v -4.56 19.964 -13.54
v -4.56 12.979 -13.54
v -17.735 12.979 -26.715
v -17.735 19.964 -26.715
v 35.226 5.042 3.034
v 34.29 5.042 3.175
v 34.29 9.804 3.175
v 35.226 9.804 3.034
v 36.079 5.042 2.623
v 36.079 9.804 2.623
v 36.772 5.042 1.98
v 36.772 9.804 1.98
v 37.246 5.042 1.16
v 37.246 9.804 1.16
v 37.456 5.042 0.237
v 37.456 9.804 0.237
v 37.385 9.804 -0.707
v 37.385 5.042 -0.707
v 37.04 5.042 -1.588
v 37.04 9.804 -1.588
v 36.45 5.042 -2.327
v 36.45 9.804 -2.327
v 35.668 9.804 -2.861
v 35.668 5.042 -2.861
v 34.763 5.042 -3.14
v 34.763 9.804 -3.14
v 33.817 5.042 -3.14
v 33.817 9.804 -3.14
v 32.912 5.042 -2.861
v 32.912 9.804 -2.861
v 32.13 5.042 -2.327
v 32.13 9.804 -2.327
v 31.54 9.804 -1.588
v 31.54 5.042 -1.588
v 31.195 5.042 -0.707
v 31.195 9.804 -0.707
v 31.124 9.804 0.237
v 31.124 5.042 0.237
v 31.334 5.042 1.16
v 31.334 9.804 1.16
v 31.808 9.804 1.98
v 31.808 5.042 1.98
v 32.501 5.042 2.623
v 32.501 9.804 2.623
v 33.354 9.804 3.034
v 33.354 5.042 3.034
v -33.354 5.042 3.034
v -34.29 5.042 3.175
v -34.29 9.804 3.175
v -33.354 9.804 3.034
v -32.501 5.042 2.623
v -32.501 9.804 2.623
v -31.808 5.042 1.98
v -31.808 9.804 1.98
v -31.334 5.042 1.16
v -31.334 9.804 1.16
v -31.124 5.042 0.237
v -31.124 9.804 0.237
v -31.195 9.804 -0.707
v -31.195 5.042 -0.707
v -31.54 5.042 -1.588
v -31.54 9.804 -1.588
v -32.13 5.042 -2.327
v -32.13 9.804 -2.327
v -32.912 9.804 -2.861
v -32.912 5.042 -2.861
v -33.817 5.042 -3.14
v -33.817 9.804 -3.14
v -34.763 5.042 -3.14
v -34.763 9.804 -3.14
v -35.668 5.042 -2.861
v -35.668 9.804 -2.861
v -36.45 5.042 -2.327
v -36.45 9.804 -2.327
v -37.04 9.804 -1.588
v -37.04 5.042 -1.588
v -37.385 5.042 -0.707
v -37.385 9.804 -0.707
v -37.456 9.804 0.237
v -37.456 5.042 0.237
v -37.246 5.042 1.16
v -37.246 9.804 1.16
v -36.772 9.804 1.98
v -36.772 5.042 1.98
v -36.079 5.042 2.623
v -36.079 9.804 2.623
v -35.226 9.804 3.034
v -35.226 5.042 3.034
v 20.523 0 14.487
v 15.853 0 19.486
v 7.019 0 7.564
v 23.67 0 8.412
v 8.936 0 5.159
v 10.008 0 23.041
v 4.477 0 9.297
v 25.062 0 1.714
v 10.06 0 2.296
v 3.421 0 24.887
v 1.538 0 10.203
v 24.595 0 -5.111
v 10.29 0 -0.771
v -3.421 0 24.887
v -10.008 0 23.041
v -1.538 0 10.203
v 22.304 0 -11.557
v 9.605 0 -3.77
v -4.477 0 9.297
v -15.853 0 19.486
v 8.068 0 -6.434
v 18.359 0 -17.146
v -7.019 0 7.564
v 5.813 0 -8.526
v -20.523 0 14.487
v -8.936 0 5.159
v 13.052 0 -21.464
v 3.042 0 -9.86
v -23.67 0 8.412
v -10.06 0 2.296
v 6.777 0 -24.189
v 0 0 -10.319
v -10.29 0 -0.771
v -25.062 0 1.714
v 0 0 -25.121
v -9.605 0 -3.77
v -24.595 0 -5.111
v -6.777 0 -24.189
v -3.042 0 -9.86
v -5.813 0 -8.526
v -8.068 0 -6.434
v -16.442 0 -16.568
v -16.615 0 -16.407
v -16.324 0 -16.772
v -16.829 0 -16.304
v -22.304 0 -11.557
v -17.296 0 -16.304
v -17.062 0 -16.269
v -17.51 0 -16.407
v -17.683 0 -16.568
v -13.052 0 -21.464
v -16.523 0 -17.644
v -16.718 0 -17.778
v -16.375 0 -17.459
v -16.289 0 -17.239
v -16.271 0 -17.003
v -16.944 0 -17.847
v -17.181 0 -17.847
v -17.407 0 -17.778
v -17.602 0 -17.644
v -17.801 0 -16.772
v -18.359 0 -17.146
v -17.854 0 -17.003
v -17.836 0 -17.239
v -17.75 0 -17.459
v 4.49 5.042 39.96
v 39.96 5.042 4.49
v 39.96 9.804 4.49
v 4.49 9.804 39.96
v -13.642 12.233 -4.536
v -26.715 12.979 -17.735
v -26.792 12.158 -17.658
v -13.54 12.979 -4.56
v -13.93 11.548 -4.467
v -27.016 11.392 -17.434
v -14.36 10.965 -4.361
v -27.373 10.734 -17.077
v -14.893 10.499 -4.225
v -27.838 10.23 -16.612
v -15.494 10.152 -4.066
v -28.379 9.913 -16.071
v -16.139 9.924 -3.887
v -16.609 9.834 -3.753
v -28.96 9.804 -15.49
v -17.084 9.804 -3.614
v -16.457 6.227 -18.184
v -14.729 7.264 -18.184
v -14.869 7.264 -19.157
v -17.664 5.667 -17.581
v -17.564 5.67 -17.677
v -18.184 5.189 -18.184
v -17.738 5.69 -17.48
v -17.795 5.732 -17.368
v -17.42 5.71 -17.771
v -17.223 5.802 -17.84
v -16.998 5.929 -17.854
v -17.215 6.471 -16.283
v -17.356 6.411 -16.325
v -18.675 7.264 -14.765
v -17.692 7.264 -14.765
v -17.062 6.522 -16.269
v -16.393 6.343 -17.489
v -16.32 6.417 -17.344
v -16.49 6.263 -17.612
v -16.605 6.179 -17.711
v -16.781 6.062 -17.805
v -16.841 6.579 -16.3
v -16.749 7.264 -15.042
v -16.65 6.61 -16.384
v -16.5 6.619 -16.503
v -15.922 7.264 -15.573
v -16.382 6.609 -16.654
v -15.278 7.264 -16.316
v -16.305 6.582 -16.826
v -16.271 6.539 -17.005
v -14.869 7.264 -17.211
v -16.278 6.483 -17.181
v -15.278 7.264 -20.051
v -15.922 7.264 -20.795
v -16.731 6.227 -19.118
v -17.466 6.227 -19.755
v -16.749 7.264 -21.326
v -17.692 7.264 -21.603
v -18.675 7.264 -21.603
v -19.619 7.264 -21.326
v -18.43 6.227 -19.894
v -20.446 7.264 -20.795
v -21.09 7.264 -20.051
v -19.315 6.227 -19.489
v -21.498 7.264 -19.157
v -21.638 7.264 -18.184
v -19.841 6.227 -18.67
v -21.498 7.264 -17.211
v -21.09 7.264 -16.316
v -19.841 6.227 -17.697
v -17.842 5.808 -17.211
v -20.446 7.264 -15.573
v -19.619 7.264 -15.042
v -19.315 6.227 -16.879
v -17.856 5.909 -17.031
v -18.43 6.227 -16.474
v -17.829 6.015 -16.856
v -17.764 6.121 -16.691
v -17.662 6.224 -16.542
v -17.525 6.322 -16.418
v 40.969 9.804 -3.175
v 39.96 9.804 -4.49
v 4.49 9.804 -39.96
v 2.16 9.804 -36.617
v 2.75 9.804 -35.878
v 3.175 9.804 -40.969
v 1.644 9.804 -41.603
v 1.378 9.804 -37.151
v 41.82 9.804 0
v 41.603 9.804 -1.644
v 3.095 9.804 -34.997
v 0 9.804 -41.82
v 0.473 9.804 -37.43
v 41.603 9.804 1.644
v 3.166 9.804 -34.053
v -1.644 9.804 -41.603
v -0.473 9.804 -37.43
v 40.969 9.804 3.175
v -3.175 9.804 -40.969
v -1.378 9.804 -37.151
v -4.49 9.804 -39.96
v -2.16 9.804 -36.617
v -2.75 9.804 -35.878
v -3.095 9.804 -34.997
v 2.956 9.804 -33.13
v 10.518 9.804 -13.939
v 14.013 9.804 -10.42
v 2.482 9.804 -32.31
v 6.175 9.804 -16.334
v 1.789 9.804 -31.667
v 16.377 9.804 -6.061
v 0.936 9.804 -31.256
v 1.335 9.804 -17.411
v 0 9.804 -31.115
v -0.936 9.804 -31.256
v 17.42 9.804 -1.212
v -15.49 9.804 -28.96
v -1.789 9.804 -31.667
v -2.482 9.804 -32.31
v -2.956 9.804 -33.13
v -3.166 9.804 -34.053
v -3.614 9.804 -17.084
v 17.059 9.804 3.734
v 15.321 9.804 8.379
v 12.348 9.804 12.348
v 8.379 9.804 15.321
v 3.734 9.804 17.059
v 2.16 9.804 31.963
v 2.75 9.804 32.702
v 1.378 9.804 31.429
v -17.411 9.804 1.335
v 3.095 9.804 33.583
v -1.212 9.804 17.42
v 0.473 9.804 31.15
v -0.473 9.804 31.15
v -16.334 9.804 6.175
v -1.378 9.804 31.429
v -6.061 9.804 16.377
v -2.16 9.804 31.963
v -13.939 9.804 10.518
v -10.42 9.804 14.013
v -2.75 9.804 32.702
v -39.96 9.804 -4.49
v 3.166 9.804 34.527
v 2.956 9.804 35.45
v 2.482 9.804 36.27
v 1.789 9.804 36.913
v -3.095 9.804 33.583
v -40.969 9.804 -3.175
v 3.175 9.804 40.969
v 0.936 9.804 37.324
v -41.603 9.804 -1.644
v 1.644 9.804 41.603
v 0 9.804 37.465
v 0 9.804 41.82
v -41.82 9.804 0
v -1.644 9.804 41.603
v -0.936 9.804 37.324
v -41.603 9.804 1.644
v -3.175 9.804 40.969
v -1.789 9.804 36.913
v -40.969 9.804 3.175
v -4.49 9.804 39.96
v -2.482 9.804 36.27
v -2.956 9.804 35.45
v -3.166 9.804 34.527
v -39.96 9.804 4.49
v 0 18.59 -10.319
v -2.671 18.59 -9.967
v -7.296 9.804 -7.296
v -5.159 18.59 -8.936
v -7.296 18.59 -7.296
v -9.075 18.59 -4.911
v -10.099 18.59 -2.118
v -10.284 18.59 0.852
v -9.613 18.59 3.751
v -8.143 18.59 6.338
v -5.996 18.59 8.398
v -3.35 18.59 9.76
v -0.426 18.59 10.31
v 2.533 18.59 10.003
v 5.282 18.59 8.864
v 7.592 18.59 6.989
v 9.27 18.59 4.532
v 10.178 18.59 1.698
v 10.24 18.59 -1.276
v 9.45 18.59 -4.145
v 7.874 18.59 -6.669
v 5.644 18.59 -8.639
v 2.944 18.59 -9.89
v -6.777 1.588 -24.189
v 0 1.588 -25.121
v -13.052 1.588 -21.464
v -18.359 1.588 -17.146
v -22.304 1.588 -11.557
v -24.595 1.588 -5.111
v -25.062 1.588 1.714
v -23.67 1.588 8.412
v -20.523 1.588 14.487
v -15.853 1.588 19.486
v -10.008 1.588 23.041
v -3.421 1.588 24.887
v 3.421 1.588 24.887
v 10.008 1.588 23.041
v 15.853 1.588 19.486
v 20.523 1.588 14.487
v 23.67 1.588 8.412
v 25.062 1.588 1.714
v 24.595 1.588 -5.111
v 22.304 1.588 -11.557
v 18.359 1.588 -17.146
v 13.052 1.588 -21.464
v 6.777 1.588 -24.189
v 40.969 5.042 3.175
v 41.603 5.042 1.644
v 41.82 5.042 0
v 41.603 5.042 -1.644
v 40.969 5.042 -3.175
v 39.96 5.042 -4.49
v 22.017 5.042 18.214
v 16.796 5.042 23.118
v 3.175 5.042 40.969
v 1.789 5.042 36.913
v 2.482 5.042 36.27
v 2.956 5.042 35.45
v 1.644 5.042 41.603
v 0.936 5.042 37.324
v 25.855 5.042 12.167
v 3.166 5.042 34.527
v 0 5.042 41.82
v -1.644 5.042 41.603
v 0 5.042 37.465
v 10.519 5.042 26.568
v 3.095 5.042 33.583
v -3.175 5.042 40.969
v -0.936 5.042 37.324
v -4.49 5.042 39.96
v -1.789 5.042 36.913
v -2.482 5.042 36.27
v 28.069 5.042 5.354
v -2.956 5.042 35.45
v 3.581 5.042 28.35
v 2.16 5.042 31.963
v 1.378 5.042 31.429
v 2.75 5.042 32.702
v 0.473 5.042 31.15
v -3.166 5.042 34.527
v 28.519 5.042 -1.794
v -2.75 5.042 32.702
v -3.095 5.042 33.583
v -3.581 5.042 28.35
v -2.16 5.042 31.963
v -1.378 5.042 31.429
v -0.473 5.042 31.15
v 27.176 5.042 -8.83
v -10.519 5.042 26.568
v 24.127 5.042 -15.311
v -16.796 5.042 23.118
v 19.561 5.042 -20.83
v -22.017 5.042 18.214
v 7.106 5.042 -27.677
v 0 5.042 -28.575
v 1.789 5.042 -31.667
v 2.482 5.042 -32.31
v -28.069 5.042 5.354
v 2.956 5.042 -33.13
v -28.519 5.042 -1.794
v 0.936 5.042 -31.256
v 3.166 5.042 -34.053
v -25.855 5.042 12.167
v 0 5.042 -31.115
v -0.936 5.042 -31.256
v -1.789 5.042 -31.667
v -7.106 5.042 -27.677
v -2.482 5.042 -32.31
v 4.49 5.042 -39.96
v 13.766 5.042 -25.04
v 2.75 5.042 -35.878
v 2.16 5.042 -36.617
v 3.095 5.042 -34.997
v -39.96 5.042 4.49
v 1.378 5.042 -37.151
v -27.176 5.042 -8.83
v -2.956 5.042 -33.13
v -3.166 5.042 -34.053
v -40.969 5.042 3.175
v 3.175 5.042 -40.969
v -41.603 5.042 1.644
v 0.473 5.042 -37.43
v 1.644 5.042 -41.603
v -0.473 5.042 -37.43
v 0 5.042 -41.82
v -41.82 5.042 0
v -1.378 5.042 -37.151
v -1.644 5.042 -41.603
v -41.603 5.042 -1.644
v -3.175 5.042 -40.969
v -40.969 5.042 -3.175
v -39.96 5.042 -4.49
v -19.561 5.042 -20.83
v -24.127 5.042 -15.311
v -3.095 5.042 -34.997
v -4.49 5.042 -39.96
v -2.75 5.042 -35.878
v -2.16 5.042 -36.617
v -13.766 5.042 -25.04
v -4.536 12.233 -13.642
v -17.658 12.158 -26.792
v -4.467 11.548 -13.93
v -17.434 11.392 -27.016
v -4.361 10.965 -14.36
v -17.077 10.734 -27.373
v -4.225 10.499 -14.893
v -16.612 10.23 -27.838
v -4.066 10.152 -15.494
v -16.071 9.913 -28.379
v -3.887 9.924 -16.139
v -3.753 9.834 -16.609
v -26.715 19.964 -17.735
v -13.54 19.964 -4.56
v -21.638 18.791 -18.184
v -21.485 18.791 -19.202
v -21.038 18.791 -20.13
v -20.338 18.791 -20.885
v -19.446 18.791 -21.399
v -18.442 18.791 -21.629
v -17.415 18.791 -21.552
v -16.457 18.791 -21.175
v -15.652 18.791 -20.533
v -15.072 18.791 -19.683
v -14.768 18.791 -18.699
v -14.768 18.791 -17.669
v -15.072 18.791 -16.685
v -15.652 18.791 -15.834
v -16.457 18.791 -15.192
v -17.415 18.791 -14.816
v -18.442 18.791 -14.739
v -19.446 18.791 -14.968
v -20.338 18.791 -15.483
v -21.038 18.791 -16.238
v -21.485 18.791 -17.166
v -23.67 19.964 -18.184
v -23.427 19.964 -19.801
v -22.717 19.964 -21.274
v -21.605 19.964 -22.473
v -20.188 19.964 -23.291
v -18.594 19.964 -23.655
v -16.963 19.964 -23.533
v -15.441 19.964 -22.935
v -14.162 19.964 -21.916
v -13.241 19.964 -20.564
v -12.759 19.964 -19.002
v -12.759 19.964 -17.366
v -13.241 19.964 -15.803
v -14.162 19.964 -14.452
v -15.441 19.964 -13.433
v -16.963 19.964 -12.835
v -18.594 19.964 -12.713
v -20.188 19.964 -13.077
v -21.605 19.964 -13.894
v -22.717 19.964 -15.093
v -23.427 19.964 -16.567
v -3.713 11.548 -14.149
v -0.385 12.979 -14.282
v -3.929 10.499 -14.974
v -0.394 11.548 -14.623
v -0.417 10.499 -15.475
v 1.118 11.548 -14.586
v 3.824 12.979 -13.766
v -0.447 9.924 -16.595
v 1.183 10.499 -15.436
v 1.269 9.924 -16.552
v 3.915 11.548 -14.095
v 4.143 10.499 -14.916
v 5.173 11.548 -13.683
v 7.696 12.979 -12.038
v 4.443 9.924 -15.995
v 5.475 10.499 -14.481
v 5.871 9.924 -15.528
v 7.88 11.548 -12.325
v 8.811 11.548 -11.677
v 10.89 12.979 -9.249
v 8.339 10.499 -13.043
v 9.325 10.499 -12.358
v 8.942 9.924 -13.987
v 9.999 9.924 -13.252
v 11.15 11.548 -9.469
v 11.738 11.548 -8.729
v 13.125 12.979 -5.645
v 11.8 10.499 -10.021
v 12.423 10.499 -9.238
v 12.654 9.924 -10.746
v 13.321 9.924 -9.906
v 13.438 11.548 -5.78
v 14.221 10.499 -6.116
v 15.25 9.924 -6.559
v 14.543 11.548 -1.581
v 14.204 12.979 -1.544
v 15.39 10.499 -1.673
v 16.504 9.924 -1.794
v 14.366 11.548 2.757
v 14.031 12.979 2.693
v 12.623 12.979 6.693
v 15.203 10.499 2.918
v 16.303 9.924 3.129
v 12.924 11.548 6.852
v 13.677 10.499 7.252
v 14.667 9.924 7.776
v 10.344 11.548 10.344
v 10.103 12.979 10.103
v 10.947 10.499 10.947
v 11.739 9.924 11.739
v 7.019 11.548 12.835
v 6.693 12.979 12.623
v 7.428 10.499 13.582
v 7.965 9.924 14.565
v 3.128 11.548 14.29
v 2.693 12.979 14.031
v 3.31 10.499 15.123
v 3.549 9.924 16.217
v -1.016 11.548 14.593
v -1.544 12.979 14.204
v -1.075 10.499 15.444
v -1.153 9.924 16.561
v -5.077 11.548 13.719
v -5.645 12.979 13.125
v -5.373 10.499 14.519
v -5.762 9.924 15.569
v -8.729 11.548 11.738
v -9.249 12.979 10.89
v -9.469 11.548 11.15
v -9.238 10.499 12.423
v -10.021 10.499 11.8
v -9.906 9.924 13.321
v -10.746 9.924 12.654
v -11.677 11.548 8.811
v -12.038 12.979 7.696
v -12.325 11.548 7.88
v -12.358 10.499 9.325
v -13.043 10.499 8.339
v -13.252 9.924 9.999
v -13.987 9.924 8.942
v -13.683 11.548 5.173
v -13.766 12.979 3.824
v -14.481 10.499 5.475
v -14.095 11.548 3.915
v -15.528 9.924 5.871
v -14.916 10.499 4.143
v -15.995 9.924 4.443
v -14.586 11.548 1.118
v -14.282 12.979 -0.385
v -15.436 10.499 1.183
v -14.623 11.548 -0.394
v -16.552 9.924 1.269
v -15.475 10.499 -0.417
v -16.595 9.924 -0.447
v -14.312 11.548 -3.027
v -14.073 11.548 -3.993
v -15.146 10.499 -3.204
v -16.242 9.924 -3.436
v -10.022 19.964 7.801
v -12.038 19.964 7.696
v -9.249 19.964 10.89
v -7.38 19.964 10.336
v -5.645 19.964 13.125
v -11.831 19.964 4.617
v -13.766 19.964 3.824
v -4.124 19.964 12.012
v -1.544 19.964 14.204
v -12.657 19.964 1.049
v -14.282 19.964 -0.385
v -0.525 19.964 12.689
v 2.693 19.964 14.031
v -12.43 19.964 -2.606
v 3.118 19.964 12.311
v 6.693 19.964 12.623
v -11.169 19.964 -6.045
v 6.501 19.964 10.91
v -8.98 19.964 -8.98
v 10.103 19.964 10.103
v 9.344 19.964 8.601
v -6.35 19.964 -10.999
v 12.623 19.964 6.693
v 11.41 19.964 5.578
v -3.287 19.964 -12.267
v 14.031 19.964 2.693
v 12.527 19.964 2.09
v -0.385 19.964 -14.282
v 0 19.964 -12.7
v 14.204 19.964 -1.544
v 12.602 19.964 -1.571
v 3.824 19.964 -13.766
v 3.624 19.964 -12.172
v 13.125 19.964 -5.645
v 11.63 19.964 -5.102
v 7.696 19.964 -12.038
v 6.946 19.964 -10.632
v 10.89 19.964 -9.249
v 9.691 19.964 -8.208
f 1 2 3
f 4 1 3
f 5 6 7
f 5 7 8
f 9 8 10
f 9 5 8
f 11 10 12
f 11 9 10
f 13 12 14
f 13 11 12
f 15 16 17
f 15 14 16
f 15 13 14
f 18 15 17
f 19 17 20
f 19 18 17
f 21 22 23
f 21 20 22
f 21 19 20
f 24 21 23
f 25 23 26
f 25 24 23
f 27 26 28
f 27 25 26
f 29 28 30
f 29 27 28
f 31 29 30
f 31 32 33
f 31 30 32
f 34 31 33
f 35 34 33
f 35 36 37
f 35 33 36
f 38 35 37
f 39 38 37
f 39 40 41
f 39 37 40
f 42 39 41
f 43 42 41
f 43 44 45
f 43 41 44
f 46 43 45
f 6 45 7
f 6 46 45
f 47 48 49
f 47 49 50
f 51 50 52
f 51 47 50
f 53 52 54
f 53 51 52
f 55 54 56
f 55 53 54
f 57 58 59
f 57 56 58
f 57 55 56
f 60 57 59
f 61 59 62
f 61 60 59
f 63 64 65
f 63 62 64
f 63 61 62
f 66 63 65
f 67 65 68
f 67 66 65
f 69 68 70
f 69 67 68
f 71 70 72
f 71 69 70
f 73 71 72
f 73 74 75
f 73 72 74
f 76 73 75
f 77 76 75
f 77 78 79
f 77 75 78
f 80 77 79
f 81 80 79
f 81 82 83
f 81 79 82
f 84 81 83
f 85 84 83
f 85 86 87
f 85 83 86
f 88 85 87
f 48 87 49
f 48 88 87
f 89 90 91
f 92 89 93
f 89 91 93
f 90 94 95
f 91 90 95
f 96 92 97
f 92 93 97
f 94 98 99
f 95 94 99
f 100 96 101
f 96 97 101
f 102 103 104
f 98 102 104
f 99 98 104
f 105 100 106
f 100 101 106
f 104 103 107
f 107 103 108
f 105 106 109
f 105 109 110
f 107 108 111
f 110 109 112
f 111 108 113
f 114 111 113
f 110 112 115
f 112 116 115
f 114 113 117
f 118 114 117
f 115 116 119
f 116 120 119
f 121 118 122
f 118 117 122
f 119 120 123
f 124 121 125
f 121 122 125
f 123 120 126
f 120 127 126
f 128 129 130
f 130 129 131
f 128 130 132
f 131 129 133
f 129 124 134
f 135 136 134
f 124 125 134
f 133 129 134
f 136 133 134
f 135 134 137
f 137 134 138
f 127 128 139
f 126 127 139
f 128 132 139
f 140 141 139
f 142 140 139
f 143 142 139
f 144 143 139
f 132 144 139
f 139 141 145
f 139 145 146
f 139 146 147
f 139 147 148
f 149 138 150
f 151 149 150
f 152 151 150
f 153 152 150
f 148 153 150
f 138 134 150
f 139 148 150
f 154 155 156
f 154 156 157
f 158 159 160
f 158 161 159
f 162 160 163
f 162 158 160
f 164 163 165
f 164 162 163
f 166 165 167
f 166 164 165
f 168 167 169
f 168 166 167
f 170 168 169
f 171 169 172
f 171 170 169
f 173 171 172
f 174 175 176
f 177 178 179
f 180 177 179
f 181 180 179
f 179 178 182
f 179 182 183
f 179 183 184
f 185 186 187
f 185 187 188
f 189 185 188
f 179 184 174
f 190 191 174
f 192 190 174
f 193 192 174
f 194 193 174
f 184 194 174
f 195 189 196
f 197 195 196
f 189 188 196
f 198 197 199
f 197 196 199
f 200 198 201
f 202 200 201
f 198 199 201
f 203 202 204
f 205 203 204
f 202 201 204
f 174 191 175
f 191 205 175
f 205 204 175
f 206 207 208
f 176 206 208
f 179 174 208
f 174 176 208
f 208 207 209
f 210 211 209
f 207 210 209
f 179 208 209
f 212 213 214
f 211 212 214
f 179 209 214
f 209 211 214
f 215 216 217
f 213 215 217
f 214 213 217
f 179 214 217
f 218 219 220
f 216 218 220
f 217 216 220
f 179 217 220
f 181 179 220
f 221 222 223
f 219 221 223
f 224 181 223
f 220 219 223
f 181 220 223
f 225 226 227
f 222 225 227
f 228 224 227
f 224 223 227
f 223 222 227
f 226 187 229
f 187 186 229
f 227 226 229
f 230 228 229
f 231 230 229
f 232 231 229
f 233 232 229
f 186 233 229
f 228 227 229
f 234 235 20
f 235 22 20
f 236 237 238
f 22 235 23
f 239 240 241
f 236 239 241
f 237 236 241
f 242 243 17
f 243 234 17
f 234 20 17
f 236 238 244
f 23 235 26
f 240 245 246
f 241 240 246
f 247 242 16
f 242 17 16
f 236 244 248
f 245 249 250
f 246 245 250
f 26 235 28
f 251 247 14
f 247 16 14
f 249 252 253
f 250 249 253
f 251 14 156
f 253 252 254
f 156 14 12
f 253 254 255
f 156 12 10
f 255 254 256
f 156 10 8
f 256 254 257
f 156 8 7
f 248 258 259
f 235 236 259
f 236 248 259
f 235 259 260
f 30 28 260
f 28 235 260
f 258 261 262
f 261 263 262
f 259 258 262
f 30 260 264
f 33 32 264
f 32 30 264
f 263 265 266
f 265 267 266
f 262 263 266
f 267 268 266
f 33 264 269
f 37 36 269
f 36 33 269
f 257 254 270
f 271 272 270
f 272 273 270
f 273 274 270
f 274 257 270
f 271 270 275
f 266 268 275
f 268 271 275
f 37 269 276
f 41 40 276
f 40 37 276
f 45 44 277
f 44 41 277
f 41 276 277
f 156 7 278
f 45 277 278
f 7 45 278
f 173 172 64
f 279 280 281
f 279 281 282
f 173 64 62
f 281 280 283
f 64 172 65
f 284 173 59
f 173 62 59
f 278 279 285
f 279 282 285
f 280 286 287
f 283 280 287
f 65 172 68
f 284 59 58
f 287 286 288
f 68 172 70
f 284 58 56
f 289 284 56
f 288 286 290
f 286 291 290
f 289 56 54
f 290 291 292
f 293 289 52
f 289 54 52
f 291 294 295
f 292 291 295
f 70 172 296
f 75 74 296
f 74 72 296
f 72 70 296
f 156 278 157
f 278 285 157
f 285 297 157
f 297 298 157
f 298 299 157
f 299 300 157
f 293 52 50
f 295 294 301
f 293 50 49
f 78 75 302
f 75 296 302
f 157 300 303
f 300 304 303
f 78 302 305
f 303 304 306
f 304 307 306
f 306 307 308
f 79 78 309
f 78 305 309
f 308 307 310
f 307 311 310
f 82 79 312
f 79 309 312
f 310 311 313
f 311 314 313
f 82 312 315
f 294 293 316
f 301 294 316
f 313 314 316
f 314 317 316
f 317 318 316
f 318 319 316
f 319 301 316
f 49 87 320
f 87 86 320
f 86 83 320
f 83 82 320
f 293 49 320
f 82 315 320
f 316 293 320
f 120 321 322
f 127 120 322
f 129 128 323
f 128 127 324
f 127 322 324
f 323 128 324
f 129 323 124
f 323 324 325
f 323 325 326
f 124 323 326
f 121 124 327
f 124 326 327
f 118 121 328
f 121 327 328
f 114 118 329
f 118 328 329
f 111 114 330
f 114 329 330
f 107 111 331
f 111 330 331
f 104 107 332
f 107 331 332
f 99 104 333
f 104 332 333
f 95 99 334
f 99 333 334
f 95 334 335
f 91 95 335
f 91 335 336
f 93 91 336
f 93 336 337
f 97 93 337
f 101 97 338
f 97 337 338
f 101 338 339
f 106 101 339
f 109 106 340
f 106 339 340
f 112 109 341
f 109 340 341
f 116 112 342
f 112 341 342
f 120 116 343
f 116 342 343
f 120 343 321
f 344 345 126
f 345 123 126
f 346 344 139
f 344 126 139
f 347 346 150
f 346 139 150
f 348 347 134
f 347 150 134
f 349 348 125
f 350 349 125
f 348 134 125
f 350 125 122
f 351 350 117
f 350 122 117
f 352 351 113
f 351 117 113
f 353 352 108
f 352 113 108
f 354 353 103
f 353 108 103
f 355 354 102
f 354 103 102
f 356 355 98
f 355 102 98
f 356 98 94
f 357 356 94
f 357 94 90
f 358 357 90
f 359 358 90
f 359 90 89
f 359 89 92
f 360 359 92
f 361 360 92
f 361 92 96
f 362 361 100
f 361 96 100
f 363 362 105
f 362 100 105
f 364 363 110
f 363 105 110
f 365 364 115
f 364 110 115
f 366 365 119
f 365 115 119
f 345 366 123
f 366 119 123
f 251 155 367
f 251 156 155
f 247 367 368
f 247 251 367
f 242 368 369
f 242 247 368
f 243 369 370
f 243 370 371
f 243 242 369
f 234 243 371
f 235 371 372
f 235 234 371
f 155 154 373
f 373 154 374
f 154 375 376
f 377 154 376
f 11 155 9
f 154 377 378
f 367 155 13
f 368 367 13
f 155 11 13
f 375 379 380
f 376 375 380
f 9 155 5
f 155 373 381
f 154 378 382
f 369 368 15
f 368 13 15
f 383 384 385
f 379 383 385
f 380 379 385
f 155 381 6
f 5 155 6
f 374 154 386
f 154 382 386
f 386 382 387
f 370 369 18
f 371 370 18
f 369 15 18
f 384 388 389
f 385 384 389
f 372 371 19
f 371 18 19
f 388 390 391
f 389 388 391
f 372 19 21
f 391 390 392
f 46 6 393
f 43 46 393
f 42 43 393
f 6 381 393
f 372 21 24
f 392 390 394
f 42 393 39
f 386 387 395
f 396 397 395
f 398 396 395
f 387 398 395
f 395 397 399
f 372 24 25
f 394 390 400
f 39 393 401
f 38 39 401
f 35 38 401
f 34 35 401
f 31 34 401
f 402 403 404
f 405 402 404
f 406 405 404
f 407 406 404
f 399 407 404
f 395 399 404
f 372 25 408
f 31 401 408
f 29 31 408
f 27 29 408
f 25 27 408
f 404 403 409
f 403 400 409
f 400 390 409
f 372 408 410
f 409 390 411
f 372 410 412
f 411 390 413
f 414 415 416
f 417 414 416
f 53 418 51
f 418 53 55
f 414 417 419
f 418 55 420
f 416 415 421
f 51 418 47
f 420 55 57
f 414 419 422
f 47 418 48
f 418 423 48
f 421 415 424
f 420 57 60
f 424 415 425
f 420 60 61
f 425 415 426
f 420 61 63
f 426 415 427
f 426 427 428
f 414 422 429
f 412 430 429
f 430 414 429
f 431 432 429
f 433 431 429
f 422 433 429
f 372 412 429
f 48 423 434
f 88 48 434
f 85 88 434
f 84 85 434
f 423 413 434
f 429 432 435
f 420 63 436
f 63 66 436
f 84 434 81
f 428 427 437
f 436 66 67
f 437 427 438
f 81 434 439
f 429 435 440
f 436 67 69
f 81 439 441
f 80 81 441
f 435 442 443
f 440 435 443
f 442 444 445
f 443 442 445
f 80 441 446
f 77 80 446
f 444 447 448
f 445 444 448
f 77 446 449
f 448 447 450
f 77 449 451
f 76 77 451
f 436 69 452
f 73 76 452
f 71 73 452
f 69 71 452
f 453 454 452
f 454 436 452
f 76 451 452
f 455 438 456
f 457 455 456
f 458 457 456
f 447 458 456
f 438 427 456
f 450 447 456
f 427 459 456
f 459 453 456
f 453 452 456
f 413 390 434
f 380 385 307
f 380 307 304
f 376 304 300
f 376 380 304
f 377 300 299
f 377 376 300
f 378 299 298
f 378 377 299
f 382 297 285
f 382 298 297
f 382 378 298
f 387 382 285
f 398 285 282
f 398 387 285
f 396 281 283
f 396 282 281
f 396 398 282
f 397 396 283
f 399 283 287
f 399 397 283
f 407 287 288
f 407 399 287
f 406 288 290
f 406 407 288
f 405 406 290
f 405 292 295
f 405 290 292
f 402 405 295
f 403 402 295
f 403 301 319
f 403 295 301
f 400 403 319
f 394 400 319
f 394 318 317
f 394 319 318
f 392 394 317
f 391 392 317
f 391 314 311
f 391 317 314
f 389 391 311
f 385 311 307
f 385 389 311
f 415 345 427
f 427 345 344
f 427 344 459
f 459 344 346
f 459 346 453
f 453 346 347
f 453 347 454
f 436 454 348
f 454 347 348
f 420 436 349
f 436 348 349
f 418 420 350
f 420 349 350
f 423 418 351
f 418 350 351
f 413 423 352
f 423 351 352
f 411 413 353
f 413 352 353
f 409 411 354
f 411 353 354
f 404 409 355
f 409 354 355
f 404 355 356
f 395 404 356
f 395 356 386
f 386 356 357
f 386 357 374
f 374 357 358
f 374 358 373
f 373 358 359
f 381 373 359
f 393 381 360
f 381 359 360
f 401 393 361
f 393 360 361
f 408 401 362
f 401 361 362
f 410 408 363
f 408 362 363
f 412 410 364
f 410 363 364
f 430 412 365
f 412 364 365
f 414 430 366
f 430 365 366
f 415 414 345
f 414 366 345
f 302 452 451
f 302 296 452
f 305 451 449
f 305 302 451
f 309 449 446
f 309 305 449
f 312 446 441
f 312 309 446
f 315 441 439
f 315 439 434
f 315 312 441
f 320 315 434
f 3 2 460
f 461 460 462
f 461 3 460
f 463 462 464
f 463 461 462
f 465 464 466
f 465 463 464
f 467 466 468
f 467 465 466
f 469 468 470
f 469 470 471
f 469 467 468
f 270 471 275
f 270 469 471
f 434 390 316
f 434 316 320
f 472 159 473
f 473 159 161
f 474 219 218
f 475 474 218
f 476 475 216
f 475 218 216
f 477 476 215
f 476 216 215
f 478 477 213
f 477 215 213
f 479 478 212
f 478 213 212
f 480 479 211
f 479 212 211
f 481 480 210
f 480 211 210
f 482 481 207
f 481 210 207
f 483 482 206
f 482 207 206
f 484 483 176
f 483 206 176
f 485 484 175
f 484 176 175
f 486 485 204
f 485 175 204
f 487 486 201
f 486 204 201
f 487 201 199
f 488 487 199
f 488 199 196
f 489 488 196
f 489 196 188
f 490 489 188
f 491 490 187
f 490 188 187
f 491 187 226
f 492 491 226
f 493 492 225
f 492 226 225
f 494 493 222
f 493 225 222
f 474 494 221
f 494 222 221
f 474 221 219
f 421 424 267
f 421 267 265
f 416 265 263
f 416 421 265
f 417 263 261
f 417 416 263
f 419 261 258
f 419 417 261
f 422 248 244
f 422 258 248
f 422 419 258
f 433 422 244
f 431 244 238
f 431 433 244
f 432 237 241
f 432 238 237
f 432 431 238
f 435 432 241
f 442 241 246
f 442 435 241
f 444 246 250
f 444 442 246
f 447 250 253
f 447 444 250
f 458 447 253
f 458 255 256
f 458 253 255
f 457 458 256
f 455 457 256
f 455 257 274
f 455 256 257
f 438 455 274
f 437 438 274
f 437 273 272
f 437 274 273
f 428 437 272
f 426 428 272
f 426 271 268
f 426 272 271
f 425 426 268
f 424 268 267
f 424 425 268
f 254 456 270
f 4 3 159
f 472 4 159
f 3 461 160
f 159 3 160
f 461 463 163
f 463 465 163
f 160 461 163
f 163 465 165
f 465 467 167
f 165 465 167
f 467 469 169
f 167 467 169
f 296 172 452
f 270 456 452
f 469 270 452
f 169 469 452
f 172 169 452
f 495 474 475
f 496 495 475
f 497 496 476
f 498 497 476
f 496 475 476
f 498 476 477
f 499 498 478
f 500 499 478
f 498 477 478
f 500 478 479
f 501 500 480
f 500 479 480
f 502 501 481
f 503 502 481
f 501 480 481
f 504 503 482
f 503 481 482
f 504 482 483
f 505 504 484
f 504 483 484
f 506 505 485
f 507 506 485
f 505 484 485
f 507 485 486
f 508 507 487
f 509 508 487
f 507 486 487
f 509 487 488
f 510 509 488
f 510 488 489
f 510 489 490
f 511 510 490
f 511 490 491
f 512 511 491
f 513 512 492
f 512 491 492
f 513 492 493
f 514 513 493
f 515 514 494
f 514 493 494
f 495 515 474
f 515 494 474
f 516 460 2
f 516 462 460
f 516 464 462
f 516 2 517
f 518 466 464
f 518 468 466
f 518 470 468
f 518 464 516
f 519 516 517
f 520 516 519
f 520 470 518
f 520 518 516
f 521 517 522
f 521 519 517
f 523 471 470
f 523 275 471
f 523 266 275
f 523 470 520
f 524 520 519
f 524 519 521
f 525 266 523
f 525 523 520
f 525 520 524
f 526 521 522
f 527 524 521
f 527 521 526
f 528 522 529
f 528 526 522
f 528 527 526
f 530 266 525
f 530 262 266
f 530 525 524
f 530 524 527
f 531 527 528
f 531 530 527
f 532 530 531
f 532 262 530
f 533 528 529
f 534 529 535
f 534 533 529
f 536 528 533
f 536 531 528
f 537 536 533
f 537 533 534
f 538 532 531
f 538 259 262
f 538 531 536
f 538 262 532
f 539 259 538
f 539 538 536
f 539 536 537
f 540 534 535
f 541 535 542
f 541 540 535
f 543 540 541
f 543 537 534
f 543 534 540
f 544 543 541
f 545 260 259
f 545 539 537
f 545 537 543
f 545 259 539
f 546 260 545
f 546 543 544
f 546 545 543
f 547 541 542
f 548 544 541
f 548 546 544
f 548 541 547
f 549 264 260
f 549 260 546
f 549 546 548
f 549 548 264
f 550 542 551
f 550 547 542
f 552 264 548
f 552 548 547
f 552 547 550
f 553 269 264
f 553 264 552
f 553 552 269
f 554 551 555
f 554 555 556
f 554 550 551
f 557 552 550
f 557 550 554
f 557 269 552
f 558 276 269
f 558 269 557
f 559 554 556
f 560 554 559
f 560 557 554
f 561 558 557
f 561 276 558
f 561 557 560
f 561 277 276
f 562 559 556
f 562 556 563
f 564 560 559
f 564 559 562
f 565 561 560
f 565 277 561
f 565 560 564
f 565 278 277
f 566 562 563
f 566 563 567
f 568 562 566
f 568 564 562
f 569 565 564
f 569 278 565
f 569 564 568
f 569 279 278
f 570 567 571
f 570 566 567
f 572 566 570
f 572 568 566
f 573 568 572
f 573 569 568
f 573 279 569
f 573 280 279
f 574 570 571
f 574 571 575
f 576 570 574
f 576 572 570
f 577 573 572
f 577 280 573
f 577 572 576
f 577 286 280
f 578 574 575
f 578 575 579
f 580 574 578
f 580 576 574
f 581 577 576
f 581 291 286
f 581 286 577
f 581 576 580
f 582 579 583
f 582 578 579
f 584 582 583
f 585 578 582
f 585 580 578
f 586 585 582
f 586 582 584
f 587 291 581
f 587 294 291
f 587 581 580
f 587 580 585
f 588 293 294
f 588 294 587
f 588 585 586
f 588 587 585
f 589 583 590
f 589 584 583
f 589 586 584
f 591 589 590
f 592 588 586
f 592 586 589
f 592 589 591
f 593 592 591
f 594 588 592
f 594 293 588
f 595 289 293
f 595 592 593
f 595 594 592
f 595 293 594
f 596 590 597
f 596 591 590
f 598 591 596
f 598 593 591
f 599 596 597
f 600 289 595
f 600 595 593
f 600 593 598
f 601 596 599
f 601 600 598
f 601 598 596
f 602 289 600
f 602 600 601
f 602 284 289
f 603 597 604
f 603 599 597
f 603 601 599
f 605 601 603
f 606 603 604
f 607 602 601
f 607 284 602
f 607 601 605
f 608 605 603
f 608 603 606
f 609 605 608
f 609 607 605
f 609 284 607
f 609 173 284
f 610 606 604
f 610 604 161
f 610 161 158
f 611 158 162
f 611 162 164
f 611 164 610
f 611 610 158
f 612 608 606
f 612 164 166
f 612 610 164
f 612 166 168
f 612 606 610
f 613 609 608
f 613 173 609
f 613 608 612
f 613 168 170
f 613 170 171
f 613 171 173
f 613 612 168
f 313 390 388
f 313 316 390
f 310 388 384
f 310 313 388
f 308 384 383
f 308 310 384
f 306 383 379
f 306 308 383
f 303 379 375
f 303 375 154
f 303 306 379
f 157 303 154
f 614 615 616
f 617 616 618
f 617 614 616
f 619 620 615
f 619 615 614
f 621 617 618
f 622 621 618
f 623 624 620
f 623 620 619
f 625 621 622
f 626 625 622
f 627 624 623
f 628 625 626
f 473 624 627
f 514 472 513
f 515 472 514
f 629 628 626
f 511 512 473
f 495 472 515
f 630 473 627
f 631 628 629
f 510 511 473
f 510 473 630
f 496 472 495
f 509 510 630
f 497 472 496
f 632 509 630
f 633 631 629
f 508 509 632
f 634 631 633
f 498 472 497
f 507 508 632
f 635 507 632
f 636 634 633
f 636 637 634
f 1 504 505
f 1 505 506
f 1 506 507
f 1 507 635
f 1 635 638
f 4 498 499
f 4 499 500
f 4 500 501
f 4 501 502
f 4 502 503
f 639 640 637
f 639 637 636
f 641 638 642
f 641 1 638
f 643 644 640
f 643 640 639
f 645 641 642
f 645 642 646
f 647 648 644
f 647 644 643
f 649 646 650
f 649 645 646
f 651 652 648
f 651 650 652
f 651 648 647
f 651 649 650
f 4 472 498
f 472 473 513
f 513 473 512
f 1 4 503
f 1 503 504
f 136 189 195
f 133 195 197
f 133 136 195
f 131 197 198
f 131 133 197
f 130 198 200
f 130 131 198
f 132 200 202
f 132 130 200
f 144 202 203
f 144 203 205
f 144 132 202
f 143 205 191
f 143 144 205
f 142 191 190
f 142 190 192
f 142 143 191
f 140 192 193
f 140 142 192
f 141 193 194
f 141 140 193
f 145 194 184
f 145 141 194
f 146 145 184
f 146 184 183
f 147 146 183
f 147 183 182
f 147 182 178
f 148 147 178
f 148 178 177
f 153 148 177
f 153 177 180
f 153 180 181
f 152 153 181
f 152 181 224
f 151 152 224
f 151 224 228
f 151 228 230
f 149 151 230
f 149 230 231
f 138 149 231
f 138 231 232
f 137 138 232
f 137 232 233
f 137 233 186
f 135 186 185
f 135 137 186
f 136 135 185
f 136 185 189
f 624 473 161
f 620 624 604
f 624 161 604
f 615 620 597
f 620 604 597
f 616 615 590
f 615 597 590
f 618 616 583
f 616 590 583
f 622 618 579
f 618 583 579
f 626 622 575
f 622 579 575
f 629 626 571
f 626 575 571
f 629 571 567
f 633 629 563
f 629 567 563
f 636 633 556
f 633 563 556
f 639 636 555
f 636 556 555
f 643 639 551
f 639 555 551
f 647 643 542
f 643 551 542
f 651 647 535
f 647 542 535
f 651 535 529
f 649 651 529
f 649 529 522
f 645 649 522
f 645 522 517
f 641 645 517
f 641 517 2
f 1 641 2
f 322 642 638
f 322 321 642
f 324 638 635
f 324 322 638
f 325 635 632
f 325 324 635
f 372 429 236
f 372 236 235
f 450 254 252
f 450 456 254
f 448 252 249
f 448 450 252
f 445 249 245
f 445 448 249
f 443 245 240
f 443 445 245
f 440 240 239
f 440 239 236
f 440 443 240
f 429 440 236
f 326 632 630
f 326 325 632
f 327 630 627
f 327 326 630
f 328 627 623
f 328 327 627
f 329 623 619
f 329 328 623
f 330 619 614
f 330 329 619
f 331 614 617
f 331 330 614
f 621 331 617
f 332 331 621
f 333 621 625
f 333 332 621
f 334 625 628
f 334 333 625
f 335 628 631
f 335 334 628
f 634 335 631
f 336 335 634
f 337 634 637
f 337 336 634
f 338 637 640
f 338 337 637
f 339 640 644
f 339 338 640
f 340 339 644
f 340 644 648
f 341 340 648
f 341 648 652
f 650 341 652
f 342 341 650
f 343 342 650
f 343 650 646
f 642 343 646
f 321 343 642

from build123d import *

# Parameters (mm, degrees)
CUT_EXTRUDE4_DEPTH           = 66.955911542
CUT_EXTRUDE4_DEPTH_BACK      = 66.955911542
SKETCH3_R                    = 3.175
FILLET3_R                    = 6.35
BOSS_EXTRUDE1_START          = 9.8044
BOSS_EXTRUDE1_DEPTH          = 10.16
FILLET2_R                    = 3.175
CHAMFER2_SIZE                = 2.38125
CHAMFER2_SIZE_2              = 1.374815329
CUT_EXTRUDE3_DEPTH           = 63.420823637
CUT_EXTRUDE3_DEPTH_BACK      = 63.420823637
SKETCH8_R                    = 0.79375
F_5_16_24_TAPPED_HOLE1_D     = 6.9088
F_5_16_24_TAPPED_HOLE1_DEPTH = 12.7
F_5_16_24_TAPPED_HOLE1_TIP   = 2.075612922
CHAMFER3_SIZE                = 2.032
CHAMFER3_SIZE2               = 1.173175747


with BuildPart() as part:
    # Sketch1 → Revolve1 (revolve)
    with BuildSketch(Plane.XY, mode=Mode.PRIVATE) as revolve1_sk:
        Polygon((10.31875, 19.9644), (14.2875, 19.9644), (14.2875, 9.8044), (44.45, 9.8044), (44.45, 5.0419), (28.575, 5.0419), (25.1206, 1.5875), (25.1206, 0), (10.31875, 0), align=None)
    revolve(revolve1_sk.sketch.rotate(Axis((0, 0, 0), (0, 1, 0)), 90), axis=Axis((0, 0, 0), (0, 1, 0)))

    # Sketch3 → Cut-Extrude4 (cut, two sides: drawn at the far end of the back side and taken through both)
    with BuildSketch(Plane(origin=(0, 0, 0), x_dir=(1, 0, 0), z_dir=(0, 1, 0)).offset(-CUT_EXTRUDE4_DEPTH_BACK)):
        with BuildLine():
            Line((0, -44.45), (-44.45, 0))
            ThreePointArc((-44.45, 0), (-31.430896424, -31.430896424), (0, -44.45))
        make_face()
        with BuildLine():
            Line((44.45, 0), (0, -44.45))
            ThreePointArc((0, -44.45), (31.430896424, -31.430896424), (44.45, 0))
        make_face()
        with BuildLine():
            ThreePointArc((44.45, 0), (31.430896424, 31.430896424), (0, 44.45))
            Line((0, 44.45), (44.45, 0))
        make_face()
        with BuildLine():
            ThreePointArc((0, 44.45), (-31.430896424, 31.430896424), (-44.45, 0))
            Line((-44.45, 0), (0, 44.45))
        make_face()
        with Locations(Location((-34.29, 0, 0), (0, 0, 270))):
            Circle(SKETCH3_R)
        with Locations(Location((0, 34.29, 0), (0, 0, 270))):
            Circle(SKETCH3_R)
        with Locations(Location((34.29, 0, 0), (0, 0, 270))):
            Circle(SKETCH3_R)
        with Locations(Location((0, -34.29, 0), (0, 0, 270))):
            Circle(SKETCH3_R)
    extrude(amount=CUT_EXTRUDE4_DEPTH + CUT_EXTRUDE4_DEPTH_BACK, mode=Mode.SUBTRACT)

    # Fillet3
    fillet3_edges = [part.edges().sort_by_distance(p)[0] for p in [
        (0, 7.42315, -44.45),
        (44.45, 7.42315, 0),
        (0, 7.42315, 44.45),
        (-44.45, 7.42315, 0),
    ]]
    fillet(fillet3_edges, radius=FILLET3_R)

    # Sketch4 → Boss-Extrude1 (add)
    with BuildSketch(Plane(origin=(0, 0, 0), x_dir=(1, 0, 0), z_dir=(0, 1, 0)).offset(BOSS_EXTRUDE1_START)):
        Polygon((-22.225, 22.225), (-26.715128061, 17.734871939), (-11.786586159, 2.806330038), (-2.806330038, 11.786586159), (-17.734871939, 26.715128061), align=None)
    extrude(amount=BOSS_EXTRUDE1_DEPTH)

    # Fillet2
    fillet2_edges = [part.edges().sort_by_distance(p)[0] for p in [
        (10.102788136, 9.8044, 10.102788136),
        (-11.147443158, 9.8044, -20.127699279),
        (-20.127699279, 9.8044, -11.147443158),
    ]]
    fillet(fillet2_edges, radius=FILLET2_R)

    # Chamfer2
    # the kernel refuses this chamfer: 2.38125, 1.374815329 mm, written as the material it takes off along each edge
    with BuildSketch(Plane(origin=(0, 19.9644, 0), x_dir=(0, 0, -1), z_dir=(1, 0, 0))) as chamfer2_piece_1:
        Polygon((10.31875 + CHAMFER2_SIZE, 0), (10.31875, -CHAMFER2_SIZE_2), (10.31875, 0), align=None)
    revolve(axis=Axis((0, 19.9644, 0), (0, 1, 0)), revolution_arc=45.000000179, mode=Mode.SUBTRACT)
    with BuildSketch(Plane(origin=(0, 19.9644, 0), x_dir=(-0.7071067833935745, 0, -0.7071067789795206), z_dir=(0.7071067789795206, 0, -0.7071067833935745))) as chamfer2_piece_2:
        Polygon((10.31875 + CHAMFER2_SIZE, 0), (10.31875, -CHAMFER2_SIZE_2), (10.31875, 0), align=None)
    revolve(axis=Axis((0, 19.9644, 0), (0, 1, 0)), revolution_arc=314.999999821, mode=Mode.SUBTRACT)

    # Sketch8 → Cut-Extrude3 (cut, two sides: drawn at the far end of the back side and taken through both)
    with BuildSketch(Plane(origin=(0, 0, 0), x_dir=(1, 0, 0), z_dir=(0, 1, 0)).offset(-CUT_EXTRUDE3_DEPTH_BACK)):
        with Locations(Location((-17.06248663, 17.06248663, 0), (0, 0, 270))):
            Circle(SKETCH8_R)
    extrude(amount=CUT_EXTRUDE3_DEPTH + CUT_EXTRUDE3_DEPTH_BACK, mode=Mode.SUBTRACT)

    # 5/16-24 Tapped Hole1
    with Locations(Plane(origin=(0, 19.9644, 0), x_dir=(1, 0, 0), z_dir=(0, 1, 0))):
        with Locations((-18.183884746, 18.183884746)):
            Hole(F_5_16_24_TAPPED_HOLE1_D / 2, depth=F_5_16_24_TAPPED_HOLE1_DEPTH)
            with Locations((0, 0, -(F_5_16_24_TAPPED_HOLE1_DEPTH + F_5_16_24_TAPPED_HOLE1_TIP / 2))):  # 118° drill point
                Cone(0, F_5_16_24_TAPPED_HOLE1_D / 2, F_5_16_24_TAPPED_HOLE1_TIP, mode=Mode.SUBTRACT)

    # Chamfer3
    chamfer3_edges = [part.edges().sort_by_distance(p)[0] for p in [
        (-14.729484746, 19.9644, -18.183884746),
    ]]
    chamfer3_side = [part.faces().sort_by_distance(p)[0] for p in [
        (-9.027932252, 19.9644, -9.027932252),
    ]]
    chamfer(chamfer3_edges, length=CHAMFER3_SIZE, length2=CHAMFER3_SIZE2, reference=chamfer3_side[0])


solid = part.part
